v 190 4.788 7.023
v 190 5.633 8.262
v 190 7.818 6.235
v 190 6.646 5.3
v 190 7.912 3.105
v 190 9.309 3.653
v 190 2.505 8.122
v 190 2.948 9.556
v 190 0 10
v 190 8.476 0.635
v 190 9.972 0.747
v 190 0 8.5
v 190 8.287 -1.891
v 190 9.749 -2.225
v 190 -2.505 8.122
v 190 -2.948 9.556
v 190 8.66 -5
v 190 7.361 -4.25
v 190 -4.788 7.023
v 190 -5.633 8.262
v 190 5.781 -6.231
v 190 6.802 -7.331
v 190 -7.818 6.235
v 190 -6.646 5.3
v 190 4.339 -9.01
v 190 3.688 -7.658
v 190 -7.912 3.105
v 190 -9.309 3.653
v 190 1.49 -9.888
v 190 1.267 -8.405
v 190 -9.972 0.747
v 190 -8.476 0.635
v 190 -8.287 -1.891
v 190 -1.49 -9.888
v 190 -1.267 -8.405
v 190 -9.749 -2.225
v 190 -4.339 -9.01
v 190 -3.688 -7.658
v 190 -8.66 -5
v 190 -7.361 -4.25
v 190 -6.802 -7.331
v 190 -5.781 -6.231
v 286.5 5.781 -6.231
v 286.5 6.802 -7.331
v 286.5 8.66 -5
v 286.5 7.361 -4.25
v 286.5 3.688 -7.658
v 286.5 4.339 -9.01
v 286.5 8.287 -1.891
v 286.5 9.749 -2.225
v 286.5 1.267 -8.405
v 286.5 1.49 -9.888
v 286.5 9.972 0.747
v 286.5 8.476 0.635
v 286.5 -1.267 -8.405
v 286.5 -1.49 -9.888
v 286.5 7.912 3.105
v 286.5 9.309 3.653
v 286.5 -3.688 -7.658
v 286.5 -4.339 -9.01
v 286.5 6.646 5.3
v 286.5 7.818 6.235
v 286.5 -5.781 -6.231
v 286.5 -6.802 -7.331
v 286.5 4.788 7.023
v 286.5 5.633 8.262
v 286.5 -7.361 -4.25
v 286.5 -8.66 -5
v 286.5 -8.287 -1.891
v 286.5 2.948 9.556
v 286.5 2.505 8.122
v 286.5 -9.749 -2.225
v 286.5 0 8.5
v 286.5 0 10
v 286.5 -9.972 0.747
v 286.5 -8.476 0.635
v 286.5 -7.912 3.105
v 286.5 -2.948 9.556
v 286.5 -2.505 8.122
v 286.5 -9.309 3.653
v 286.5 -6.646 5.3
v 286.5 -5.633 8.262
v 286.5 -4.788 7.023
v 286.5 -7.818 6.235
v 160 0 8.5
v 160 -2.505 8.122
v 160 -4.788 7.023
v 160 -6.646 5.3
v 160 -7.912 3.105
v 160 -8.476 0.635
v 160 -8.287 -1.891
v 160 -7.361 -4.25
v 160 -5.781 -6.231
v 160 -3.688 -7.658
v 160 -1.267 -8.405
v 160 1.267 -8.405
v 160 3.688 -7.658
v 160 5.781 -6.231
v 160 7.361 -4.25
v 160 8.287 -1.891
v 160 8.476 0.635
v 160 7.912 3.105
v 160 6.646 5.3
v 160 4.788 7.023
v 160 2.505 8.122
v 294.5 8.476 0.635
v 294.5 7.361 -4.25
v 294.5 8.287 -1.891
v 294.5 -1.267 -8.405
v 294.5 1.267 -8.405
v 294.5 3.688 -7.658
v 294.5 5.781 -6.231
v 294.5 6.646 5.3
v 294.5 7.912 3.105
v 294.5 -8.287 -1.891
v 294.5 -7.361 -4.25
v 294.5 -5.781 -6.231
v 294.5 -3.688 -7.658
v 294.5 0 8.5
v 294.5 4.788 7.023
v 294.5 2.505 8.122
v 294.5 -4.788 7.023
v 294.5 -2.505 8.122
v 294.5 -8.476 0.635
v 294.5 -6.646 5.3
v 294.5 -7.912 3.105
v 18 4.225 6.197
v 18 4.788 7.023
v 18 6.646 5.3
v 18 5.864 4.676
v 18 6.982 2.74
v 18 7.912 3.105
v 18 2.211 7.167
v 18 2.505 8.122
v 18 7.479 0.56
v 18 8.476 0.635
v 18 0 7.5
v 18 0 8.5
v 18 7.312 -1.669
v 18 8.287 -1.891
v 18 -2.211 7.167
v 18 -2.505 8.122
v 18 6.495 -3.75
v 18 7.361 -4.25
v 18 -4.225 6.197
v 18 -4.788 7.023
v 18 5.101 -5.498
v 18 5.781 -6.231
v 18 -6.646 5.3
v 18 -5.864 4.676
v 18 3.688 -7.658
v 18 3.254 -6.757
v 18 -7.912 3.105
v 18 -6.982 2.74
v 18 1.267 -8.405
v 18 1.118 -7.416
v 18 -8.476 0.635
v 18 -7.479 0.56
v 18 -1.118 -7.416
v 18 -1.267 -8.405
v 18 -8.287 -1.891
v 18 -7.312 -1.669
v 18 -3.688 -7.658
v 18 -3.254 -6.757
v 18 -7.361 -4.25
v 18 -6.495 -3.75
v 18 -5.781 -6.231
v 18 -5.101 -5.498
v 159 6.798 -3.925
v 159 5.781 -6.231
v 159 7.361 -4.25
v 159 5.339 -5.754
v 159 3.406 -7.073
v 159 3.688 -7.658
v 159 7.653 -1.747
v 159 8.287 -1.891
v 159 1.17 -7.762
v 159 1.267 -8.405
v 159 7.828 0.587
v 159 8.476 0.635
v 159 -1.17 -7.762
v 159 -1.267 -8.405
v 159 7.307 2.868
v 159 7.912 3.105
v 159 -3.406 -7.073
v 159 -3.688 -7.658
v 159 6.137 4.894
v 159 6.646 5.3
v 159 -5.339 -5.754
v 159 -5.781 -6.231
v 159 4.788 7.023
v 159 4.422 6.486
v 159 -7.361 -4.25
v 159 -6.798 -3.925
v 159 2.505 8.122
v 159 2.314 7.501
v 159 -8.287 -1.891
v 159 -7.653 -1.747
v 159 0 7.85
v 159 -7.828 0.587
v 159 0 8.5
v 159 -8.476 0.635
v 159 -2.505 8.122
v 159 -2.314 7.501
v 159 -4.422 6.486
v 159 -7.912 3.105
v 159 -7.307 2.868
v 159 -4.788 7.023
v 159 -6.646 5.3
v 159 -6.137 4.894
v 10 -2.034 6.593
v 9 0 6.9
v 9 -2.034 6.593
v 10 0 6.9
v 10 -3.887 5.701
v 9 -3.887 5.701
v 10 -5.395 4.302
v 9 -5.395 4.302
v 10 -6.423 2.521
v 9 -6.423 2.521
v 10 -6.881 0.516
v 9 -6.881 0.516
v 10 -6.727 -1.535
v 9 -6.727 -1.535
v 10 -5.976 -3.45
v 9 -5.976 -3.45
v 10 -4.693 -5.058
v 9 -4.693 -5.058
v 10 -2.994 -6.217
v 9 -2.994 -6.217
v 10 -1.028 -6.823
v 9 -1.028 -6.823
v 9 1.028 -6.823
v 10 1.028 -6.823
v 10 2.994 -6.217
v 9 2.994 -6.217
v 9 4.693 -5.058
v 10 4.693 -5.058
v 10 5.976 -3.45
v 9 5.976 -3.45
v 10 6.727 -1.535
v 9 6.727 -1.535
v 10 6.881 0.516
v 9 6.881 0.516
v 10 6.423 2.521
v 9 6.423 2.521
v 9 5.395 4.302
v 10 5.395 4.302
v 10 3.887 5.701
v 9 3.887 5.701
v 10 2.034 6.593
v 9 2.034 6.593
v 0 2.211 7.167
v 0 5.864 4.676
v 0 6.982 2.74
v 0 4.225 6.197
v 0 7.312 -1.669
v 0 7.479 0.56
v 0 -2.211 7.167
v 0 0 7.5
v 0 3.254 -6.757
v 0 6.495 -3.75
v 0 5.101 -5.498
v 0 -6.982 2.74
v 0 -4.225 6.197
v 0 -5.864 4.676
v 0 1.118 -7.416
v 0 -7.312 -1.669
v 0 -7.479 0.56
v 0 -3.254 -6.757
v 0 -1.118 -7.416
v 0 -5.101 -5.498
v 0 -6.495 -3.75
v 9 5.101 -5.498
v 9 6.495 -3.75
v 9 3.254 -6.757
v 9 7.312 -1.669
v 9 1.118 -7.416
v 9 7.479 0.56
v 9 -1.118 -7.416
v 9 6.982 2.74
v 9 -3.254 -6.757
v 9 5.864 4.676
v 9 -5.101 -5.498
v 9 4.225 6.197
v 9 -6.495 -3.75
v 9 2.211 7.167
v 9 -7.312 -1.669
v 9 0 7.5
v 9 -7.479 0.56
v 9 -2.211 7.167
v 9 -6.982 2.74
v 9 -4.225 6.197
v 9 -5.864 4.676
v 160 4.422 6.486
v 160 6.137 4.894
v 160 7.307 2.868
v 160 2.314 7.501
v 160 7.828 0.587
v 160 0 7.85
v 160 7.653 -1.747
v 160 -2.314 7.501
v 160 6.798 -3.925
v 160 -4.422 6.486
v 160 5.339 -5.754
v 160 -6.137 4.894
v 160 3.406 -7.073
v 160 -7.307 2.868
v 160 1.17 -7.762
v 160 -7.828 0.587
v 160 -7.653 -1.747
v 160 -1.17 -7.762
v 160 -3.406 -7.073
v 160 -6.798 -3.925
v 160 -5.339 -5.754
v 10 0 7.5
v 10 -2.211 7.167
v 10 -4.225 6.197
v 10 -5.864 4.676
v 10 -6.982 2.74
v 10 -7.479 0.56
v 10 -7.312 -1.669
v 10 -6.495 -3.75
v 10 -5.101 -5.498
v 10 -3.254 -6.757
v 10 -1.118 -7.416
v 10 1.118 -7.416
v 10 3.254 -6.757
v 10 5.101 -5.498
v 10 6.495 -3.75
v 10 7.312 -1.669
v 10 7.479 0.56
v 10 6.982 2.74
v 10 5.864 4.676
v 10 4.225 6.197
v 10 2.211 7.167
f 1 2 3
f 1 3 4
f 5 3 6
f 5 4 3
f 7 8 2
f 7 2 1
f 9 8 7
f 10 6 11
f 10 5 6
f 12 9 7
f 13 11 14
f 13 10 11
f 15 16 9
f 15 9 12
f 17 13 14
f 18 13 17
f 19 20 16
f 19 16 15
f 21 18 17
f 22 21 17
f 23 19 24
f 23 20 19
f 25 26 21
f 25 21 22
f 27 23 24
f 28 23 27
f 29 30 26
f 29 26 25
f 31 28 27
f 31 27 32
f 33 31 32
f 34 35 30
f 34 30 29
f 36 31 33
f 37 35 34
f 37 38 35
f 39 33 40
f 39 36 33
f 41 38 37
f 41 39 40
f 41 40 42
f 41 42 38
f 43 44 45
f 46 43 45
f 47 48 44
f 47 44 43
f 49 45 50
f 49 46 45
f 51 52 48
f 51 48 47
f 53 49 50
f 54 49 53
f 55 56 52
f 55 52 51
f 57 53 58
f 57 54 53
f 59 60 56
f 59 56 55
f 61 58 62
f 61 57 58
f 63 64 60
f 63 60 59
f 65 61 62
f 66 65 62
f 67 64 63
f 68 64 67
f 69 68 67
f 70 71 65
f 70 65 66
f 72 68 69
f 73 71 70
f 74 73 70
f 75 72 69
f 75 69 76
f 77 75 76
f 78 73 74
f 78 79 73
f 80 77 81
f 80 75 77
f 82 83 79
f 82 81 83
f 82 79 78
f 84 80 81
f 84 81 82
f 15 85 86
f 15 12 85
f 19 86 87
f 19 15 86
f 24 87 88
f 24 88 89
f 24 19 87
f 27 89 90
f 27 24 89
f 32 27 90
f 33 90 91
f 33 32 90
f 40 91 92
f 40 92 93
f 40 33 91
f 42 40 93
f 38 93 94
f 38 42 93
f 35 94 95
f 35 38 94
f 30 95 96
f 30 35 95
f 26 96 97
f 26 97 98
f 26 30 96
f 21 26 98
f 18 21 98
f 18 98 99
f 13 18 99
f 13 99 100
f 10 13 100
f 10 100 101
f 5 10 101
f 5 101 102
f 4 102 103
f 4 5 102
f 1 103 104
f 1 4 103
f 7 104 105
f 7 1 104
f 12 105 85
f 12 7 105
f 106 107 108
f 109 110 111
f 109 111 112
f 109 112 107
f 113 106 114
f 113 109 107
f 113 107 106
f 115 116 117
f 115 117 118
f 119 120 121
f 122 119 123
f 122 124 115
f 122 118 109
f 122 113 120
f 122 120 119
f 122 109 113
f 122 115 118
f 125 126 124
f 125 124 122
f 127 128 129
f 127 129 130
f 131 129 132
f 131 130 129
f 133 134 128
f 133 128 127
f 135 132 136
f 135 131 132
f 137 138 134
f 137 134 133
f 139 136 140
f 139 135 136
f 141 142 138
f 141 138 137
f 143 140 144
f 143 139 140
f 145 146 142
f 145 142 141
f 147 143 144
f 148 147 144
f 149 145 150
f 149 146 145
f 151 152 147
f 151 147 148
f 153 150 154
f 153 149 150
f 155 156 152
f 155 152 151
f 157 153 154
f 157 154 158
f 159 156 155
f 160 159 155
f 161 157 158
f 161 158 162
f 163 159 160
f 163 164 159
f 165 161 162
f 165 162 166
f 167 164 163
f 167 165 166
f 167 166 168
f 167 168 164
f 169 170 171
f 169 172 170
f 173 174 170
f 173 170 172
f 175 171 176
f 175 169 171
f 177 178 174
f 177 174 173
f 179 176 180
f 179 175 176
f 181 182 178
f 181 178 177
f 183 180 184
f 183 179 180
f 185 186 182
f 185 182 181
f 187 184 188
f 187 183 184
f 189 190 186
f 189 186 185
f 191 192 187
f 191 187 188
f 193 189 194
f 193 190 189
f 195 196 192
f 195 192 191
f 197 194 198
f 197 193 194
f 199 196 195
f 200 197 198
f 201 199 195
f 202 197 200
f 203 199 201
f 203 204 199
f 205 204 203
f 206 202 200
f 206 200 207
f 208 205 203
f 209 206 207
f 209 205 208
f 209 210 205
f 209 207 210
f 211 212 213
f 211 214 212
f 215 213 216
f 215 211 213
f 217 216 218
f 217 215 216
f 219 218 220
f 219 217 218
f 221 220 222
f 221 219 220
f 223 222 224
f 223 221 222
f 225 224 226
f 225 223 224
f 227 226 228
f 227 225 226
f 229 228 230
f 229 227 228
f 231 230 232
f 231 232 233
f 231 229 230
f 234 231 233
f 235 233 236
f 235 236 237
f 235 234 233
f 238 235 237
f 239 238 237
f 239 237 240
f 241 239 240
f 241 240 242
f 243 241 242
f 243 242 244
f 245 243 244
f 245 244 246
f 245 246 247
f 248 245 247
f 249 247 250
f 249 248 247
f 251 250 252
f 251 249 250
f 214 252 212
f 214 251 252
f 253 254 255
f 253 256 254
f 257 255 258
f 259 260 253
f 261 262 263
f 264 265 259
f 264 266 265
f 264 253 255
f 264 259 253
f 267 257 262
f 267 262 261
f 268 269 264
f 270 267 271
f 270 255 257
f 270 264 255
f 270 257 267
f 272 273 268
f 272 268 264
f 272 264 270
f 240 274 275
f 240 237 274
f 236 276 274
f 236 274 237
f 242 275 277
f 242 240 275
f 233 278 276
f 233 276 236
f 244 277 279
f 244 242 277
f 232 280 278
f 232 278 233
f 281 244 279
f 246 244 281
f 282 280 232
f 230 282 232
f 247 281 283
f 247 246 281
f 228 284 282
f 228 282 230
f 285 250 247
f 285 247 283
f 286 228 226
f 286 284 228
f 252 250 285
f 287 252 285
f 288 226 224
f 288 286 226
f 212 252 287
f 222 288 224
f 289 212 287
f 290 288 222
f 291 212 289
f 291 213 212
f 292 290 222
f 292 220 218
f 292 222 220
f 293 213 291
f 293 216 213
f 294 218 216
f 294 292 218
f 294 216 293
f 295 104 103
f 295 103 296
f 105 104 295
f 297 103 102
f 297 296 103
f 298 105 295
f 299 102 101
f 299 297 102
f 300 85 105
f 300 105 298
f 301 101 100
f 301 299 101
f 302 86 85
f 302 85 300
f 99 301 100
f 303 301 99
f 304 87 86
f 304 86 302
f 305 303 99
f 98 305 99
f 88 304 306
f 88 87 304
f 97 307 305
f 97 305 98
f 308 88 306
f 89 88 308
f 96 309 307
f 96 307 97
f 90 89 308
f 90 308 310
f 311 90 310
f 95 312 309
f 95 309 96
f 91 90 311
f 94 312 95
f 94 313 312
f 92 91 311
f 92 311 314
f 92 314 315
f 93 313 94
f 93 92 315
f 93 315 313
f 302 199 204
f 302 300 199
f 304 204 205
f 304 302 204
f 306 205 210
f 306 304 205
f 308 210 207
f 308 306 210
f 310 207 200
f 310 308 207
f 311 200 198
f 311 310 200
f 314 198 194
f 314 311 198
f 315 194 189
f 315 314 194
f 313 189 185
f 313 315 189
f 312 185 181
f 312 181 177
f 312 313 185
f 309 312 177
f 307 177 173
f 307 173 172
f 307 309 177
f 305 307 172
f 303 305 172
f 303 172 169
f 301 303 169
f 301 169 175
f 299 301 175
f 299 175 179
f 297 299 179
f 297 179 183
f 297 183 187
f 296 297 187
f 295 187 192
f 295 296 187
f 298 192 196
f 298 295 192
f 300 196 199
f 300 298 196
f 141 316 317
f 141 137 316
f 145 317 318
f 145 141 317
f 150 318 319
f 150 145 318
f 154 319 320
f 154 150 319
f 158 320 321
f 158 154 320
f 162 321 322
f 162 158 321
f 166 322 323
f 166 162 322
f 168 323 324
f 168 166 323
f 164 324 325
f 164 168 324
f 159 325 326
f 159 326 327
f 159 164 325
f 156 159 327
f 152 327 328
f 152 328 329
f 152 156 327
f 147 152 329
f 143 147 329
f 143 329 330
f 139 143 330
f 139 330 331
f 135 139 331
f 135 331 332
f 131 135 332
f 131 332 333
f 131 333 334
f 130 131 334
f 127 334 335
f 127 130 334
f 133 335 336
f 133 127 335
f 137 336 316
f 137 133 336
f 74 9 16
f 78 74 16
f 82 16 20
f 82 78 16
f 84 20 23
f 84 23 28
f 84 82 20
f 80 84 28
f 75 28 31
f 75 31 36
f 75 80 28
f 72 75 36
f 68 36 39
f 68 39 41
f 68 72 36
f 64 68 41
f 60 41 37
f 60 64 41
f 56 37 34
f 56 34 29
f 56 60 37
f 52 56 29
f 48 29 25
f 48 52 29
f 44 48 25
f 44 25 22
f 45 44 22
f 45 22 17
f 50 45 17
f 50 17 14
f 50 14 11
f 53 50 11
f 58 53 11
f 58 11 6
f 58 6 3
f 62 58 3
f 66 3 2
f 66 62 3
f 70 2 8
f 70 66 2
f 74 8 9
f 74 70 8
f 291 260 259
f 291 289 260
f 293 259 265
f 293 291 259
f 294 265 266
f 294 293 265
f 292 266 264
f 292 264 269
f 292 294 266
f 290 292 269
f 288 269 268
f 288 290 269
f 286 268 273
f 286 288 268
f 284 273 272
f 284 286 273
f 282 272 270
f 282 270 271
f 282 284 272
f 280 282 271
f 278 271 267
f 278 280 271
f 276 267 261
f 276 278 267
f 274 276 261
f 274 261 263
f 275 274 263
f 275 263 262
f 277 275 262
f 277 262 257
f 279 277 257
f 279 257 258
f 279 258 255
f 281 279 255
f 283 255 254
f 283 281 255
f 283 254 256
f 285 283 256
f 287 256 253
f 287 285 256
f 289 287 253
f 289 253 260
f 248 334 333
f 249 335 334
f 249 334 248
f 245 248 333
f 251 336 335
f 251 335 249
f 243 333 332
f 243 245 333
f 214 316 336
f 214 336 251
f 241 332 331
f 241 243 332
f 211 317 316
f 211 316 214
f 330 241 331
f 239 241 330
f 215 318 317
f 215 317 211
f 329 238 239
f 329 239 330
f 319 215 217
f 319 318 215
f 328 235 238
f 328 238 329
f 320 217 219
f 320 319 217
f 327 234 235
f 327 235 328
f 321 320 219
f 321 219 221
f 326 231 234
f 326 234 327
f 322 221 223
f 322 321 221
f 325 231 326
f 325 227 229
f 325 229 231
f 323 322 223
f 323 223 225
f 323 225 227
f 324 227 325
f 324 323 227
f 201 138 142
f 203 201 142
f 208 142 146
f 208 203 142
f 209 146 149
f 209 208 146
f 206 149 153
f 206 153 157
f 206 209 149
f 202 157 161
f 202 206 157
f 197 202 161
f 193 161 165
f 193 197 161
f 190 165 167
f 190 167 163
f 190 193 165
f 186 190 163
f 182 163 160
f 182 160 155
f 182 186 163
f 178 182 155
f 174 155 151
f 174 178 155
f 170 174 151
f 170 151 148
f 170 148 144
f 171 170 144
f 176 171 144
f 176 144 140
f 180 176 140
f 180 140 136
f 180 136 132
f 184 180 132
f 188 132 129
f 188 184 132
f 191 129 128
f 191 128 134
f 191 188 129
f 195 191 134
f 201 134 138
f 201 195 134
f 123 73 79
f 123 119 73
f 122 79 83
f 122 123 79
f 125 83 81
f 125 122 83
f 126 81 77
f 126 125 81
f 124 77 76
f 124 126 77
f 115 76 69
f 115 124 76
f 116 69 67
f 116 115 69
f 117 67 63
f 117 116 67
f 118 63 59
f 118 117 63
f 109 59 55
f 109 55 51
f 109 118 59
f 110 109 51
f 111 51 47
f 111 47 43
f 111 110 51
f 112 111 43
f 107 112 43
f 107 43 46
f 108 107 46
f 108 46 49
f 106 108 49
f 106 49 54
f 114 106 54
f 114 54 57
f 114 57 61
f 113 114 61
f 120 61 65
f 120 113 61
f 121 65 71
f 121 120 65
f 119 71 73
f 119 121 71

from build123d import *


with BuildPart() as part:
    # 草图1 → 旋转1 (revolve)
    with BuildSketch(Plane(origin=(0, 0, 0), x_dir=(1, 0, 0), z_dir=(0, 1, 0)), mode=Mode.PRIVATE) as revolve_1_sk:
        Polygon((0, 0), (0, 7.5), (9, 7.5), (9, 6.9), (10, 6.9), (10, 7.5), (18, 7.5), (18, 8.5), (159, 8.5), (159, 7.85), (160, 7.85), (160, 8.5), (190, 8.5), (190, 10), (286.5, 10), (286.5, 8.5), (294.5, 8.5), (294.5, 0), align=None)
    revolve(revolve_1_sk.sketch.rotate(Axis((-79.560771626, 0, 0), (1, 0, 0)), 180), axis=Axis((-79.560771626, 0, 0), (1, 0, 0)))


solid = part.part
